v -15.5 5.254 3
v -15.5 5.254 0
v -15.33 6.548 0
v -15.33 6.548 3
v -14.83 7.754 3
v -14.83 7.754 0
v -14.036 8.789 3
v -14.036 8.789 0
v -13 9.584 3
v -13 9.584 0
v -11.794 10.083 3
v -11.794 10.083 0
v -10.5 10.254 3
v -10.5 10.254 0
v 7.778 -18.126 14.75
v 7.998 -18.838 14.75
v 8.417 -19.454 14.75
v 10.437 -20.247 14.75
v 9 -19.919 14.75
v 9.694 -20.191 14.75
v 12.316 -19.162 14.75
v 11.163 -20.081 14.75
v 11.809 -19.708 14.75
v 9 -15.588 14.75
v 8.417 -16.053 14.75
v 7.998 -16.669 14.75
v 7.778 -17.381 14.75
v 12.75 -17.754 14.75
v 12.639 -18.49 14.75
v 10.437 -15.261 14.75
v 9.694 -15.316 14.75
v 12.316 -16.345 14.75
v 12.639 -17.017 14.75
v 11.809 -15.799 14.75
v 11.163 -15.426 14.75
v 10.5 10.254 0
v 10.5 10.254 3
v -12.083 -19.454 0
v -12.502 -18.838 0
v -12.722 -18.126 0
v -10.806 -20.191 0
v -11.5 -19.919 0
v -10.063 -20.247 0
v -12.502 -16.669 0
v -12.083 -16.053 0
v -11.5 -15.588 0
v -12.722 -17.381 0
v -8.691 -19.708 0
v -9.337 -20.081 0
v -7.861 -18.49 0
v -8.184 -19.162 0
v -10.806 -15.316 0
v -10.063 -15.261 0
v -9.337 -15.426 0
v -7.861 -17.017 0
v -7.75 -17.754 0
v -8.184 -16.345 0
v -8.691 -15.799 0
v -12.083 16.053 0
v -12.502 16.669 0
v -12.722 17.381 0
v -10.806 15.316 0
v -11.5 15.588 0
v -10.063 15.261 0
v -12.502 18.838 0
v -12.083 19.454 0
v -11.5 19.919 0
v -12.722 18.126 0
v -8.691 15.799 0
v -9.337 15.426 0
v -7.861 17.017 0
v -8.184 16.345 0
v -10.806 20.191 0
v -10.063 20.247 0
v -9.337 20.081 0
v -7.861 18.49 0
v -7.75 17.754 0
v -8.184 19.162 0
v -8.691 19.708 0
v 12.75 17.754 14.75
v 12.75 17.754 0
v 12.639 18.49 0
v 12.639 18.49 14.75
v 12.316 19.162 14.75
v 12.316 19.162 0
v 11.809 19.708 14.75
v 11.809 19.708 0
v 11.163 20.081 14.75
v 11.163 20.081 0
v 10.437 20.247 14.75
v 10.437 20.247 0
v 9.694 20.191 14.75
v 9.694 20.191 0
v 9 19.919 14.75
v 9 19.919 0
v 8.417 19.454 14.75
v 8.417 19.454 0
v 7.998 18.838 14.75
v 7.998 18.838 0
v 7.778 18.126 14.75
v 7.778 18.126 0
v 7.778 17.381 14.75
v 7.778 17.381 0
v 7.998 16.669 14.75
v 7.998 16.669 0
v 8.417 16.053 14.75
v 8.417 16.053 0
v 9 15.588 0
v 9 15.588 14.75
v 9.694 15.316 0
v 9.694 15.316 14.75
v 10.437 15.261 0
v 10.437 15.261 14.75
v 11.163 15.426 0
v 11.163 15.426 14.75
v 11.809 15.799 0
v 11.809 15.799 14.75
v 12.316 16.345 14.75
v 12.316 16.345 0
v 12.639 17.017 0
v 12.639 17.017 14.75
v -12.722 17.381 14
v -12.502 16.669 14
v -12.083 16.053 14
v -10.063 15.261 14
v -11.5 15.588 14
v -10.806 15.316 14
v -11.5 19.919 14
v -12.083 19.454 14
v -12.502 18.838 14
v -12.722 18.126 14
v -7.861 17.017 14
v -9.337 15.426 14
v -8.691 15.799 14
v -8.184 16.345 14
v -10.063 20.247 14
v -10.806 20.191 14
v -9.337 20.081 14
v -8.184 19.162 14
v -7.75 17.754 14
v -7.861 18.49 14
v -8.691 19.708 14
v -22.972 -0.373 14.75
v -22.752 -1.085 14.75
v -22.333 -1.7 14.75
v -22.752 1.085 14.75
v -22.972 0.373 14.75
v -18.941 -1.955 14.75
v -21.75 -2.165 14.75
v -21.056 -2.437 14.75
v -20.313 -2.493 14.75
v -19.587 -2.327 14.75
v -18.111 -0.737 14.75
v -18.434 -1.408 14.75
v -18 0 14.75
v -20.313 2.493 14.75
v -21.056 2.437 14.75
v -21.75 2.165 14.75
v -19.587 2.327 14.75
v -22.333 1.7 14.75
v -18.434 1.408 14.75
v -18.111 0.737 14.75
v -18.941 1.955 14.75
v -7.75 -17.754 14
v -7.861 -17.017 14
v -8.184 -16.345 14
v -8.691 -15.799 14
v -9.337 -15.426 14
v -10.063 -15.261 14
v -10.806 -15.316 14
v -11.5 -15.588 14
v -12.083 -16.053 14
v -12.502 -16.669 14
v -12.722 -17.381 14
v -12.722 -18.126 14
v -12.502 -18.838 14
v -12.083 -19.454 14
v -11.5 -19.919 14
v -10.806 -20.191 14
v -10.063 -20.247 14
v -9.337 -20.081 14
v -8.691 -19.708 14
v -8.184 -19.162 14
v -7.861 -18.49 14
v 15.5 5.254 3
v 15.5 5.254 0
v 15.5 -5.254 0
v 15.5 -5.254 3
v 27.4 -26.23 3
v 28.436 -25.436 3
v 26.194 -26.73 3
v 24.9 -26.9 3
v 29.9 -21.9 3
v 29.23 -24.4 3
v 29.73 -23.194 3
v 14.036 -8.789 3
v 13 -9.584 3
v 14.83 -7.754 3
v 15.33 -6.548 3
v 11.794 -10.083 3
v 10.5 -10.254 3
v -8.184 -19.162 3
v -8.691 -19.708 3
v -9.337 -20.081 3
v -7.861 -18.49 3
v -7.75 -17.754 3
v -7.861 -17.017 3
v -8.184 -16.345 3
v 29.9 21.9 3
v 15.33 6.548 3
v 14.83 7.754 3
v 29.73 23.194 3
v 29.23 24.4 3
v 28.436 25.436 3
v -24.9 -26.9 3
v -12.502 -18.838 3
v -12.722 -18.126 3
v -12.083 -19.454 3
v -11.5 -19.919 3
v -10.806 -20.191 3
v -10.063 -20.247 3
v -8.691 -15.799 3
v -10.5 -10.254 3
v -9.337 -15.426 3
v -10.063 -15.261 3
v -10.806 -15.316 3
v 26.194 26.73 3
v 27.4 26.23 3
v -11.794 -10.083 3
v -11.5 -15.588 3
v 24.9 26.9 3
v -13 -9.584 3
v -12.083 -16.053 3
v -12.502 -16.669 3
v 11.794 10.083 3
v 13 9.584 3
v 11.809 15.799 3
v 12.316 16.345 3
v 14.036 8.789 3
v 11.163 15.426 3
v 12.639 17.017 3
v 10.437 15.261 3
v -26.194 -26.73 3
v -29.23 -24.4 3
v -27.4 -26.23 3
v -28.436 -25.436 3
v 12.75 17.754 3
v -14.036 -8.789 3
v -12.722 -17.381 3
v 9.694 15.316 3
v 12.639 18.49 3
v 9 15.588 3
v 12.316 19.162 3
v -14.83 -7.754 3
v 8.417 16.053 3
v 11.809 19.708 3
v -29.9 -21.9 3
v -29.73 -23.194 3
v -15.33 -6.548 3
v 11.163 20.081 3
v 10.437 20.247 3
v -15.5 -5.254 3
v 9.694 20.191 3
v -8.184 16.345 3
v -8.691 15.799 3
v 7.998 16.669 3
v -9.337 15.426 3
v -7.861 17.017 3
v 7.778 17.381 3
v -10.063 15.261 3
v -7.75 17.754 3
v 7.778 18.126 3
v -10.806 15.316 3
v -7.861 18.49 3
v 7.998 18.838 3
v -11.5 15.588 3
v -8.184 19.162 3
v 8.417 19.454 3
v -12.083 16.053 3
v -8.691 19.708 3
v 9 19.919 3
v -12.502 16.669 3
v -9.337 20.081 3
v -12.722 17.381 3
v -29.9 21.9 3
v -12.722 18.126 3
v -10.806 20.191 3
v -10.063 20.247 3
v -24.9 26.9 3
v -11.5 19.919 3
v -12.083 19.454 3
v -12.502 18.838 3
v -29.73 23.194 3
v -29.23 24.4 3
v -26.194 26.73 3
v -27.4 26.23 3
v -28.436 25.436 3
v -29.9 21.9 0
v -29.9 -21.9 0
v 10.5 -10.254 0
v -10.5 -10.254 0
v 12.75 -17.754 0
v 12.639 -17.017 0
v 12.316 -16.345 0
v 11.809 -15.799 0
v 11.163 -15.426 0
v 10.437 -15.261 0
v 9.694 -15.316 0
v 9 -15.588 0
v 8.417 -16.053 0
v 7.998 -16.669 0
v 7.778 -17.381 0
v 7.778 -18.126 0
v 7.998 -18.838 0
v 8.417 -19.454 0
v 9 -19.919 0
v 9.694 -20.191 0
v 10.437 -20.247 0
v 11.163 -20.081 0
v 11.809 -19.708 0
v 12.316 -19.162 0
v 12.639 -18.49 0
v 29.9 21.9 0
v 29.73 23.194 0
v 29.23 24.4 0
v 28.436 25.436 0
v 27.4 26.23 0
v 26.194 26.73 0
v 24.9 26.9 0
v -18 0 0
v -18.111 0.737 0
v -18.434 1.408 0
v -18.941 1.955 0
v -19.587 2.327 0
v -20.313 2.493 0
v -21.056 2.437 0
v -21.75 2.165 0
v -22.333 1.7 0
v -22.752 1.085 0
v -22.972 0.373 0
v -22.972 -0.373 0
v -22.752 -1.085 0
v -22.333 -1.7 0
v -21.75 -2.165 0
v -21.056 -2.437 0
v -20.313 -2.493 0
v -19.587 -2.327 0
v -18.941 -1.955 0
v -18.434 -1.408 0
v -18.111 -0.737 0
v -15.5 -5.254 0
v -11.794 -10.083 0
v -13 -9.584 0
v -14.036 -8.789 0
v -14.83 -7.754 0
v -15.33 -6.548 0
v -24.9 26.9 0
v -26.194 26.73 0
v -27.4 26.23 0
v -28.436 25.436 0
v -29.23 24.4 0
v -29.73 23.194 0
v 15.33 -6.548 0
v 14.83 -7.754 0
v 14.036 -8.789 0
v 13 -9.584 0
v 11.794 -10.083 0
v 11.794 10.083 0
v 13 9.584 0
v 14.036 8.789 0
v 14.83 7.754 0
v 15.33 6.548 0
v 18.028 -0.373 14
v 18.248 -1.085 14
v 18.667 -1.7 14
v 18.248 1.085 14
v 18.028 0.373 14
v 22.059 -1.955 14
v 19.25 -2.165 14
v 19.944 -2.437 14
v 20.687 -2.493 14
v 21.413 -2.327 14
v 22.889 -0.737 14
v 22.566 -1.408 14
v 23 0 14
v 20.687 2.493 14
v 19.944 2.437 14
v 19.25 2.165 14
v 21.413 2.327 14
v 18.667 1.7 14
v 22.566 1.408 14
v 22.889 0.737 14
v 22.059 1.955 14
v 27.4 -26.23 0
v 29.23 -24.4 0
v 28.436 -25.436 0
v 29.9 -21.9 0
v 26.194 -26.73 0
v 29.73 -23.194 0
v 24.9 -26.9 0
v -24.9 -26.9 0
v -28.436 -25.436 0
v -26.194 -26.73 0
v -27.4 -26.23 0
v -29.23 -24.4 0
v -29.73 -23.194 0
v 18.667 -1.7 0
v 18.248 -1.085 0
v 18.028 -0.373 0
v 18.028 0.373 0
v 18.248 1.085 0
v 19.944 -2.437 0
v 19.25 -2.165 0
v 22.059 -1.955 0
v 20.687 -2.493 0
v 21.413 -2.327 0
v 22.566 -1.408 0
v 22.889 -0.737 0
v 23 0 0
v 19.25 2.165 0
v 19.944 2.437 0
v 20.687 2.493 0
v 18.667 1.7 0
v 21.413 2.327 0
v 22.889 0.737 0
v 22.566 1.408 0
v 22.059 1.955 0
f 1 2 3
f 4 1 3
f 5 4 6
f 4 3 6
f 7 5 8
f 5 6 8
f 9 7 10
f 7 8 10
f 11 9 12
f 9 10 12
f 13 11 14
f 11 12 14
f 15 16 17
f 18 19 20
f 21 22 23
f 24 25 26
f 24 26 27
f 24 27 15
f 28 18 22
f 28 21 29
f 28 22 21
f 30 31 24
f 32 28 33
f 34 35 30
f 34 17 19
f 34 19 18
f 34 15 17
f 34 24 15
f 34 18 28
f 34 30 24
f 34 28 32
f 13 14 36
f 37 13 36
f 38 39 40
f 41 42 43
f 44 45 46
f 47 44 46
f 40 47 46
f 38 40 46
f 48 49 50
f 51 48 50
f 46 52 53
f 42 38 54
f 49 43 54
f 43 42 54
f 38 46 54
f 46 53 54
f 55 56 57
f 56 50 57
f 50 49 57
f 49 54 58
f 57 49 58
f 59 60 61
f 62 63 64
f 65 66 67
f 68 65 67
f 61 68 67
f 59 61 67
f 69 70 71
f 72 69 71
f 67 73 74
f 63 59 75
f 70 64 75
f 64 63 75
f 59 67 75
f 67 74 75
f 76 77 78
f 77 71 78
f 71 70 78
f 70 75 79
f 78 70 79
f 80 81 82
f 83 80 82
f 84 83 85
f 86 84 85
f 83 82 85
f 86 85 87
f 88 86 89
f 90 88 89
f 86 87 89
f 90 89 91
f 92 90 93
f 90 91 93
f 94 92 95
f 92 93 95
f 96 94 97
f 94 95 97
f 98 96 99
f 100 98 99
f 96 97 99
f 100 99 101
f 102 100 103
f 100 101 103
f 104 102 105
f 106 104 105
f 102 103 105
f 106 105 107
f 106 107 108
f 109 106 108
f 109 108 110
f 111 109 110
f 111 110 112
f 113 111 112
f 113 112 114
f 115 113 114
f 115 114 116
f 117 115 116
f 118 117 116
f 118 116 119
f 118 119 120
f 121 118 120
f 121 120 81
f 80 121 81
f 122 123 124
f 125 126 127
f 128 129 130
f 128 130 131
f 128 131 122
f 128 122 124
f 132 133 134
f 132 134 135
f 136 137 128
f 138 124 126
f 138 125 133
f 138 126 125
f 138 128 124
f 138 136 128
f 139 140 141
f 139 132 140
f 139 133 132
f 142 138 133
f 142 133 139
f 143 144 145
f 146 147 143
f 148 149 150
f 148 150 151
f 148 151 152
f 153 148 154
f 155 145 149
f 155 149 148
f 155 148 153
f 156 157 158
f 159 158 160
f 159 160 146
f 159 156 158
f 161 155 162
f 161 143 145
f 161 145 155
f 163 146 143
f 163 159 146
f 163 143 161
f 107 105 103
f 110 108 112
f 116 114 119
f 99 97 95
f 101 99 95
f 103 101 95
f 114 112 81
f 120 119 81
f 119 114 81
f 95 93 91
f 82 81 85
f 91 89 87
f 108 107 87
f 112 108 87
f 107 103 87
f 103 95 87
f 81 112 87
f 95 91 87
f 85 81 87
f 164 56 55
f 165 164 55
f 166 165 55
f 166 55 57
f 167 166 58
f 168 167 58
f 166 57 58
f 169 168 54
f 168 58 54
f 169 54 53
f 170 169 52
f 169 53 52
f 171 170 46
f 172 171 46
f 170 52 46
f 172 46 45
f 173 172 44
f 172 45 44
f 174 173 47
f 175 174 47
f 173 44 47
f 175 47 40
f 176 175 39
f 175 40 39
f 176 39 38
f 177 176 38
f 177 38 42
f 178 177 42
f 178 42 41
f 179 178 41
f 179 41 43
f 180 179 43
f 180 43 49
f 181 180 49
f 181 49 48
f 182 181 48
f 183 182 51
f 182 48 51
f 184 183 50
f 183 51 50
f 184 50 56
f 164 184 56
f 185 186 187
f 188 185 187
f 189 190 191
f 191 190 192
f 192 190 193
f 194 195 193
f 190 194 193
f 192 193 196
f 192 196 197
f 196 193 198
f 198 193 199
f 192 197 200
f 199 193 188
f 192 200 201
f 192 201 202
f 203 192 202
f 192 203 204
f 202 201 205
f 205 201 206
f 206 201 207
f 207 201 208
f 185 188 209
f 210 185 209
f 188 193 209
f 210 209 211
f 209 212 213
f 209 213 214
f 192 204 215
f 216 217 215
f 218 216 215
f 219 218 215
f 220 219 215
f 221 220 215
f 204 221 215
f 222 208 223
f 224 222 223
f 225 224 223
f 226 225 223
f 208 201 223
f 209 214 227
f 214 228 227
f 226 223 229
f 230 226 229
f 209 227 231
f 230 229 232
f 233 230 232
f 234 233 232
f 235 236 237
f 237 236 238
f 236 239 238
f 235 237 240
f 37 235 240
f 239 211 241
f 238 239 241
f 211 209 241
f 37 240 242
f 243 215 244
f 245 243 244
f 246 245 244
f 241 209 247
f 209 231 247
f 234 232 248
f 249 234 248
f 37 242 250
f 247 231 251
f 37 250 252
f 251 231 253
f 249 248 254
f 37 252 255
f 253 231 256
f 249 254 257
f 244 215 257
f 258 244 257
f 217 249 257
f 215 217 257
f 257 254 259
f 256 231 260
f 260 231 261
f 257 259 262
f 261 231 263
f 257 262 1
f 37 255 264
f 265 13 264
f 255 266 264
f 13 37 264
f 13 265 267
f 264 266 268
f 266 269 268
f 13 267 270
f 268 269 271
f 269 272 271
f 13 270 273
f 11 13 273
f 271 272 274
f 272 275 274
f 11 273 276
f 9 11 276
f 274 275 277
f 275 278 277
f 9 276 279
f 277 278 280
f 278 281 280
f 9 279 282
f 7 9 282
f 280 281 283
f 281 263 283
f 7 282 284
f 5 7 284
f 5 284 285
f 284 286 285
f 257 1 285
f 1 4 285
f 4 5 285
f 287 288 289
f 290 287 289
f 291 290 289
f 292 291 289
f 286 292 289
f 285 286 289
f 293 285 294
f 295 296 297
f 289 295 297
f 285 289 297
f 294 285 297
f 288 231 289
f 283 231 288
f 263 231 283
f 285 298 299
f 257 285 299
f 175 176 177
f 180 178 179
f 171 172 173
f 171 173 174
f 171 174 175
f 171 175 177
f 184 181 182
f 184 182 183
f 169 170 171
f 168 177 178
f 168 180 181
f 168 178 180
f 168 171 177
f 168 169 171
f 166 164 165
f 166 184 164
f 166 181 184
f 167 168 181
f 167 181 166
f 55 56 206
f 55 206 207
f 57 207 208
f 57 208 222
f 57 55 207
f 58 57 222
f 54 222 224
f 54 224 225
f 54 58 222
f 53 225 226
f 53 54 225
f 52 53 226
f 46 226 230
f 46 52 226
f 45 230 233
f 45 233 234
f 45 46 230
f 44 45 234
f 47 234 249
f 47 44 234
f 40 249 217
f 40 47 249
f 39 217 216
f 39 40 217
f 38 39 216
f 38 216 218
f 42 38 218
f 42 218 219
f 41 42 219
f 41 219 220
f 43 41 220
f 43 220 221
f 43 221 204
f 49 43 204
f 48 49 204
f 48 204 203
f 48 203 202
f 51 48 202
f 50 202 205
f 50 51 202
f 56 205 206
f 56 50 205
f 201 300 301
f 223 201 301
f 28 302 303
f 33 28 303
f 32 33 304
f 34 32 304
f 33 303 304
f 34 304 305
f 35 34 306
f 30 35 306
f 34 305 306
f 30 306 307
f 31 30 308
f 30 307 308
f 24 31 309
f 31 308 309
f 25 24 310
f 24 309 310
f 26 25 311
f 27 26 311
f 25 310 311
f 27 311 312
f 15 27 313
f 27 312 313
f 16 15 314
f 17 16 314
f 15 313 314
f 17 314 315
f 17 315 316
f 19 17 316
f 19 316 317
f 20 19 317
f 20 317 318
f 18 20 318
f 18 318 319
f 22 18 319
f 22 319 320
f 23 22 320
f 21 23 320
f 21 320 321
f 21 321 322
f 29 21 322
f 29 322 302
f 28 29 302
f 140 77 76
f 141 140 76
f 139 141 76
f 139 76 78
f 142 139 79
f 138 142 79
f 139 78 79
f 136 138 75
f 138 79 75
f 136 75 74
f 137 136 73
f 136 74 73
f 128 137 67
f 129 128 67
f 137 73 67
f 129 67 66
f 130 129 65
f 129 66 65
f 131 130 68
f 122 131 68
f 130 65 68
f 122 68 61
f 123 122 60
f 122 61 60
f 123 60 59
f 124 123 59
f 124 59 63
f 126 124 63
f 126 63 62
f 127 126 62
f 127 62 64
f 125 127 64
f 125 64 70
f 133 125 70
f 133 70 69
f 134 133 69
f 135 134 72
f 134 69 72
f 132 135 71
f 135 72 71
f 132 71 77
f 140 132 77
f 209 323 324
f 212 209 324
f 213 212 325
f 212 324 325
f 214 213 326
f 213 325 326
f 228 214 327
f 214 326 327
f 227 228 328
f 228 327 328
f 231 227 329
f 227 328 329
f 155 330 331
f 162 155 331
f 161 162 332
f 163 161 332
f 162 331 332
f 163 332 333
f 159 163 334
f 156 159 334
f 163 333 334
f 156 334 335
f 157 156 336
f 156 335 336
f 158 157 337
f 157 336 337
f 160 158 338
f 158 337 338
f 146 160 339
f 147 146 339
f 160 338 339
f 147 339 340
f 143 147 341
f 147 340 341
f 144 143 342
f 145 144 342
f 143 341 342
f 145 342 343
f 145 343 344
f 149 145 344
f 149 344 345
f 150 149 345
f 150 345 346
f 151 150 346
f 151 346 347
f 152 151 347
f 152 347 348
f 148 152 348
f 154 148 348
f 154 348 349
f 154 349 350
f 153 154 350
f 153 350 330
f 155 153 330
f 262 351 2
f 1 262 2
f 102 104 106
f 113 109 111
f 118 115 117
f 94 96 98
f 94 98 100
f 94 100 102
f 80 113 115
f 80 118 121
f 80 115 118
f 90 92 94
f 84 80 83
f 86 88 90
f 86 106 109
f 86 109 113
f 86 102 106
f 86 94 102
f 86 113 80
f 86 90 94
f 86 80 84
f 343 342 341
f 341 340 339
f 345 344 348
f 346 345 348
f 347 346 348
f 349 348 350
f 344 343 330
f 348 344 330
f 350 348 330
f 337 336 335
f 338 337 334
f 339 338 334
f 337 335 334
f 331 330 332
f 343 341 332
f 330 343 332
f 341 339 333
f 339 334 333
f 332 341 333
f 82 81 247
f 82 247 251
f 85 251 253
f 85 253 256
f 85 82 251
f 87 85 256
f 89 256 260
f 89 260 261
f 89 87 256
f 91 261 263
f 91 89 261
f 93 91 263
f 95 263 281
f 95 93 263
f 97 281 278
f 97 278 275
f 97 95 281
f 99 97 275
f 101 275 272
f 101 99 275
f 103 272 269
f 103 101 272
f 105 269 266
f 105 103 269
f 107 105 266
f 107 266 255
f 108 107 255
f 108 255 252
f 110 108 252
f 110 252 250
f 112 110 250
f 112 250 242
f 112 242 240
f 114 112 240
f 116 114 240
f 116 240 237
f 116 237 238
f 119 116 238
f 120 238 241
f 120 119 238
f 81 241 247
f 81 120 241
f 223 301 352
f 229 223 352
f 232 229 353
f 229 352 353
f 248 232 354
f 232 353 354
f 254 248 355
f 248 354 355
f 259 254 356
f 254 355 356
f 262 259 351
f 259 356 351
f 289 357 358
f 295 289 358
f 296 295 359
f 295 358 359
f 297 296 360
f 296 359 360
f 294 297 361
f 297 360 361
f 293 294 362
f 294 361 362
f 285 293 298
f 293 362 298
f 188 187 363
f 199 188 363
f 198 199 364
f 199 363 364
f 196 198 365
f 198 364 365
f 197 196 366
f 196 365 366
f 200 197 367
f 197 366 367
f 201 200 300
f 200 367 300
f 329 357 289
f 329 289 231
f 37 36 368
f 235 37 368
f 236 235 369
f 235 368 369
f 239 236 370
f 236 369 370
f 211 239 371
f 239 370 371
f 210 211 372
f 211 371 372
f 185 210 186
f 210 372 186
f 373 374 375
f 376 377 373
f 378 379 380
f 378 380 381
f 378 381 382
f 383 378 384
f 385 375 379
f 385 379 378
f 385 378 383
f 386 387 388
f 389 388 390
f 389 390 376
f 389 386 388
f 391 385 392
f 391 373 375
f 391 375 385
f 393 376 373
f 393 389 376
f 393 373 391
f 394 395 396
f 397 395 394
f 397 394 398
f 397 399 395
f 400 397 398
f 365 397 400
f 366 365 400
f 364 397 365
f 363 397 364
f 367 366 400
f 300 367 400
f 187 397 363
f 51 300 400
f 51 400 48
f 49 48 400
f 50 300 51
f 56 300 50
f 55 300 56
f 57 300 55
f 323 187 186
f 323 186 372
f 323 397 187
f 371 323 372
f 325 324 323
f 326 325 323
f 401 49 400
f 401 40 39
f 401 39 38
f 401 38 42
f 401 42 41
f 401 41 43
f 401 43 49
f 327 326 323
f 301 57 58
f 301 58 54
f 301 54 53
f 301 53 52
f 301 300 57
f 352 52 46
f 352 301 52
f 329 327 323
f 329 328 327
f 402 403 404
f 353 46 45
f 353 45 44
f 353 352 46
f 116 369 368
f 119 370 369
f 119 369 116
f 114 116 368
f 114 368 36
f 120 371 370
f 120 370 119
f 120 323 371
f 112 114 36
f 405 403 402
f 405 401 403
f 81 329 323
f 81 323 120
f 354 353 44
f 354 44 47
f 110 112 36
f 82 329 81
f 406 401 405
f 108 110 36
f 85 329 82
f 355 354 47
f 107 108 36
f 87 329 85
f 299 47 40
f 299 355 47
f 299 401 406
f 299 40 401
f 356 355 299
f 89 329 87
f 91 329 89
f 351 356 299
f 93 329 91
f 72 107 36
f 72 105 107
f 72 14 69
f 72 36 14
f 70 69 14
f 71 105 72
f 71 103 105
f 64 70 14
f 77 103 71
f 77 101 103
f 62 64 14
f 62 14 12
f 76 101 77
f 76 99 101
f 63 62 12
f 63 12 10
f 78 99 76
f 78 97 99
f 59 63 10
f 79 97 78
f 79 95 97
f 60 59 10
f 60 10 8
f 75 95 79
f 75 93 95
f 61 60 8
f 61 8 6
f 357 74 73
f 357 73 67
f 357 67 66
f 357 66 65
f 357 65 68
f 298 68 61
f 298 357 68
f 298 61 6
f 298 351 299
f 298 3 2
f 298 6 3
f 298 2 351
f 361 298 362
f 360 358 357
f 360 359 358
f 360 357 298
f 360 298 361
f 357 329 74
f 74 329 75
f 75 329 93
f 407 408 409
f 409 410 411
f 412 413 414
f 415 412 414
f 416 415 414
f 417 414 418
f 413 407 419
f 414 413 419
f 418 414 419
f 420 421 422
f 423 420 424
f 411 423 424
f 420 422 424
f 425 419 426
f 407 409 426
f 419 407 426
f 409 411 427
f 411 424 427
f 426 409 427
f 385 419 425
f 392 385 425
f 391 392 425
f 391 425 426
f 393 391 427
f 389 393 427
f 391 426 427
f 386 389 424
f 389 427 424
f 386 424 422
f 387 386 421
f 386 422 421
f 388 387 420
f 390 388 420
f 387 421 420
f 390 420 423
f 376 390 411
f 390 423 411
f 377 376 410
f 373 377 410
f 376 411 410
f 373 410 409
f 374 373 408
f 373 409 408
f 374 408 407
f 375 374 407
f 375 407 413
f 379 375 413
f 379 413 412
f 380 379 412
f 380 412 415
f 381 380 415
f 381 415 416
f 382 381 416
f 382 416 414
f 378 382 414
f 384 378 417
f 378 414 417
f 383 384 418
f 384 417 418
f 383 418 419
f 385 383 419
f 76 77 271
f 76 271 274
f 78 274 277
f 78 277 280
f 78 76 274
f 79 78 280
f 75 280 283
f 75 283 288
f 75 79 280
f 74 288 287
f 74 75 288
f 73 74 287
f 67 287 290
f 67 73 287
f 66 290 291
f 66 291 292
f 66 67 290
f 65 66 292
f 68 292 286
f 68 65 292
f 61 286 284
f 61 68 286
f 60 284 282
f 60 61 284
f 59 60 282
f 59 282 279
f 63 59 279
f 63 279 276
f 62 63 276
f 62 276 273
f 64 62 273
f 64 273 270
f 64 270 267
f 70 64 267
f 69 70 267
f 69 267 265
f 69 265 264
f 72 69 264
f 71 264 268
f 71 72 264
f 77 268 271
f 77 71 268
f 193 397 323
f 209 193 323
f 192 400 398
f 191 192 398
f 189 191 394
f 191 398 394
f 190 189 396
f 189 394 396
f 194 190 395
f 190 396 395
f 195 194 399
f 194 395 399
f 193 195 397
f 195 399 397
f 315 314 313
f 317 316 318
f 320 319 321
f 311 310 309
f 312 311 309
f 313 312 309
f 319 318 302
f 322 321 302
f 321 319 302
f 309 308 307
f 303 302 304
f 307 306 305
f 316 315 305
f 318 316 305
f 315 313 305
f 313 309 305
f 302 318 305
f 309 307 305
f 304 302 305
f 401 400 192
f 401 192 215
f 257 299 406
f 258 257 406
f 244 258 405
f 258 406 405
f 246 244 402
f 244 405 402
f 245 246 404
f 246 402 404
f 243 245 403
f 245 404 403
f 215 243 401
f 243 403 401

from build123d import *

# Parameters (mm, degrees)
SKETCH_1_R          = 2.5
EXTRUDE_1_DEPTH     = 3
SKETCH_1_4_R        = 2.5
EXTRUDE_2_DEPTH     = 14
EXTRUDE_2_2_DEPTH   = 14
EXTRUDE_2_3_DEPTH   = 14
EXTRUDE_2_4_DEPTH   = 14
EXTRUDE_2_5_DEPTH   = 14
EXTRUDE_2_6_DEPTH   = 14
SKETCH_2_R          = 2.5
EXTRUDE_3_DEPTH     = 7.75
CUT_EXTRUDE_1_DEPTH = 47.467004422


with BuildPart() as part:
    # 草圖1 → 填料-伸長1 (new body)
    with BuildSketch(Plane.XY):
        with BuildLine():
            Line((-29.9, 26.9), (29.9, 26.9))
            ThreePointArc((29.9, 26.9), (33.435533906, 25.435533906), (34.9, 21.9))
            Line((34.9, 21.9), (34.9, -21.9))
            ThreePointArc((34.9, -21.9), (33.435533906, -25.435533906), (29.9, -26.9))
            Line((29.9, -26.9), (-29.9, -26.9))
            ThreePointArc((-29.9, -26.9), (-33.435533906, -25.435533906), (-34.9, -21.9))
            Line((-34.9, -21.9), (-34.9, 21.9))
            ThreePointArc((-34.9, 21.9), (-33.435533906, 25.435533906), (-29.9, 26.9))
        make_face()
        with Locations((10.25, 17.753520778)):
            Circle(SKETCH_1_R, mode=Mode.SUBTRACT)
        with Locations((-10.25, -17.753520778)):
            Circle(SKETCH_1_R, mode=Mode.SUBTRACT)
        with Locations((-10.25, 17.753520778)):
            Circle(SKETCH_1_R, mode=Mode.SUBTRACT)
        with BuildLine():
            Line((-10.5, 10.253520778), (10.5, 10.253520778))
            ThreePointArc((10.5, 10.253520778), (14.035533906, 8.789054684), (15.5, 5.253520778))
            Line((15.5, 5.253520778), (15.5, -5.253520778))
            ThreePointArc((15.5, -5.253520778), (14.035533906, -8.789054684), (10.5, -10.253520778))
            Line((10.5, -10.253520778), (-10.5, -10.253520778))
            ThreePointArc((-10.5, -10.253520778), (-14.035533906, -8.789054684), (-15.5, -5.253520778))
            Line((-15.5, -5.253520778), (-15.5, 5.253520778))
            ThreePointArc((-15.5, 5.253520778), (-14.035533906, 8.789054684), (-10.5, 10.253520778))
        make_face(mode=Mode.SUBTRACT)
    extrude(amount=EXTRUDE_1_DEPTH)

    # 草圖3 → 除料-伸長1 (cut, through all)
    with BuildSketch(Plane(origin=(0, 0, 0), x_dir=(-1, 0, 0), z_dir=(0, 0, -1))):
        with BuildLine():
            Line((-29.9, -21.9), (-29.9, 21.9))
            ThreePointArc((-29.9, 21.9), (-28.435533906, 25.435533906), (-24.9, 26.9))
            Line((-24.9, 26.9), (-29.9, 26.9))
            ThreePointArc((-29.9, 26.9), (-33.435533906, 25.435533906), (-34.9, 21.9))
            Line((-34.9, 21.9), (-34.9, -21.9))
            ThreePointArc((-34.9, -21.9), (-33.435533906, -25.435533906), (-29.9, -26.9))
            Line((-29.9, -26.9), (-24.9, -26.9))
            ThreePointArc((-24.9, -26.9), (-28.435533906, -25.435533906), (-29.9, -21.9))
        make_face()
        with BuildLine():
            Line((29.9, 26.9), (24.9, 26.9))
            ThreePointArc((24.9, 26.9), (28.435533906, 25.435533906), (29.9, 21.9))
            Line((29.9, 21.9), (29.9, -21.9))
            ThreePointArc((29.9, -21.9), (28.435533906, -25.435533906), (24.9, -26.9))
            Line((24.9, -26.9), (29.9, -26.9))
            ThreePointArc((29.9, -26.9), (33.435533906, -25.435533906), (34.9, -21.9))
            Line((34.9, -21.9), (34.9, 21.9))
            ThreePointArc((34.9, 21.9), (33.435533906, 25.435533906), (29.9, 26.9))
        make_face()
    extrude(amount=-CUT_EXTRUDE_1_DEPTH, mode=Mode.SUBTRACT)


with BuildPart() as body_2:
    # 草圖1<4> → 填料-伸長2 (new body)
    with BuildSketch(Plane.XY):
        with Locations((20.5, 0)):
            Circle(SKETCH_1_4_R)
    extrude(amount=EXTRUDE_2_DEPTH)


with BuildPart() as body_3:
    # 草圖1<4> → Extrude 2 2 (new body)
    with BuildSketch(Plane.XY):
        with Locations((-20.5, 0)):
            Circle(SKETCH_1_4_R)
    extrude(amount=EXTRUDE_2_2_DEPTH)



with BuildPart() as body_4:
    # 草圖1<4> → Extrude 2 3 (new body)
    with BuildSketch(Plane.XY):
        with Locations((10.25, 17.753520778)):
            Circle(SKETCH_1_4_R)
    extrude(amount=EXTRUDE_2_3_DEPTH)


with BuildPart() as body_5:
    # 草圖1<4> → Extrude 2 4 (new body)
    with BuildSketch(Plane.XY):
        with Locations((10.25, -17.753520778)):
            Circle(SKETCH_1_4_R)
    extrude(amount=EXTRUDE_2_4_DEPTH)


with BuildPart() as body_6:
    # 草圖1<4> → Extrude 2 5 (new body)
    with BuildSketch(Plane.XY):
        with Locations((-10.25, -17.753520778)):
            Circle(SKETCH_1_4_R)
    extrude(amount=EXTRUDE_2_5_DEPTH)


with BuildPart() as body_7:
    # 草圖1<4> → Extrude 2 6 (new body)
    with BuildSketch(Plane.XY):
        with Locations((-10.25, 17.753520778)):
            Circle(SKETCH_1_4_R)
    extrude(amount=EXTRUDE_2_6_DEPTH)


with BuildPart() as body_3_1:
    add(body_3.part)

    add(body_4.part)  # 填料-伸長3 merges body 4

    add(body_5.part)  # 填料-伸長3 merges body 5
    # 草圖2 → 填料-伸長3 (add)
    with BuildSketch(Plane.XY.offset(7)):
        with Locations((-20.5, 0)):
            Circle(SKETCH_2_R)
        with Locations((10.25, 17.753520778)):
            Circle(SKETCH_2_R)
        with Locations((10.25, -17.753520778)):
            Circle(SKETCH_2_R)
    extrude(amount=EXTRUDE_3_DEPTH)


solid = Compound([part.part, body_2.part, body_6.part, body_7.part, body_3_1.part])
